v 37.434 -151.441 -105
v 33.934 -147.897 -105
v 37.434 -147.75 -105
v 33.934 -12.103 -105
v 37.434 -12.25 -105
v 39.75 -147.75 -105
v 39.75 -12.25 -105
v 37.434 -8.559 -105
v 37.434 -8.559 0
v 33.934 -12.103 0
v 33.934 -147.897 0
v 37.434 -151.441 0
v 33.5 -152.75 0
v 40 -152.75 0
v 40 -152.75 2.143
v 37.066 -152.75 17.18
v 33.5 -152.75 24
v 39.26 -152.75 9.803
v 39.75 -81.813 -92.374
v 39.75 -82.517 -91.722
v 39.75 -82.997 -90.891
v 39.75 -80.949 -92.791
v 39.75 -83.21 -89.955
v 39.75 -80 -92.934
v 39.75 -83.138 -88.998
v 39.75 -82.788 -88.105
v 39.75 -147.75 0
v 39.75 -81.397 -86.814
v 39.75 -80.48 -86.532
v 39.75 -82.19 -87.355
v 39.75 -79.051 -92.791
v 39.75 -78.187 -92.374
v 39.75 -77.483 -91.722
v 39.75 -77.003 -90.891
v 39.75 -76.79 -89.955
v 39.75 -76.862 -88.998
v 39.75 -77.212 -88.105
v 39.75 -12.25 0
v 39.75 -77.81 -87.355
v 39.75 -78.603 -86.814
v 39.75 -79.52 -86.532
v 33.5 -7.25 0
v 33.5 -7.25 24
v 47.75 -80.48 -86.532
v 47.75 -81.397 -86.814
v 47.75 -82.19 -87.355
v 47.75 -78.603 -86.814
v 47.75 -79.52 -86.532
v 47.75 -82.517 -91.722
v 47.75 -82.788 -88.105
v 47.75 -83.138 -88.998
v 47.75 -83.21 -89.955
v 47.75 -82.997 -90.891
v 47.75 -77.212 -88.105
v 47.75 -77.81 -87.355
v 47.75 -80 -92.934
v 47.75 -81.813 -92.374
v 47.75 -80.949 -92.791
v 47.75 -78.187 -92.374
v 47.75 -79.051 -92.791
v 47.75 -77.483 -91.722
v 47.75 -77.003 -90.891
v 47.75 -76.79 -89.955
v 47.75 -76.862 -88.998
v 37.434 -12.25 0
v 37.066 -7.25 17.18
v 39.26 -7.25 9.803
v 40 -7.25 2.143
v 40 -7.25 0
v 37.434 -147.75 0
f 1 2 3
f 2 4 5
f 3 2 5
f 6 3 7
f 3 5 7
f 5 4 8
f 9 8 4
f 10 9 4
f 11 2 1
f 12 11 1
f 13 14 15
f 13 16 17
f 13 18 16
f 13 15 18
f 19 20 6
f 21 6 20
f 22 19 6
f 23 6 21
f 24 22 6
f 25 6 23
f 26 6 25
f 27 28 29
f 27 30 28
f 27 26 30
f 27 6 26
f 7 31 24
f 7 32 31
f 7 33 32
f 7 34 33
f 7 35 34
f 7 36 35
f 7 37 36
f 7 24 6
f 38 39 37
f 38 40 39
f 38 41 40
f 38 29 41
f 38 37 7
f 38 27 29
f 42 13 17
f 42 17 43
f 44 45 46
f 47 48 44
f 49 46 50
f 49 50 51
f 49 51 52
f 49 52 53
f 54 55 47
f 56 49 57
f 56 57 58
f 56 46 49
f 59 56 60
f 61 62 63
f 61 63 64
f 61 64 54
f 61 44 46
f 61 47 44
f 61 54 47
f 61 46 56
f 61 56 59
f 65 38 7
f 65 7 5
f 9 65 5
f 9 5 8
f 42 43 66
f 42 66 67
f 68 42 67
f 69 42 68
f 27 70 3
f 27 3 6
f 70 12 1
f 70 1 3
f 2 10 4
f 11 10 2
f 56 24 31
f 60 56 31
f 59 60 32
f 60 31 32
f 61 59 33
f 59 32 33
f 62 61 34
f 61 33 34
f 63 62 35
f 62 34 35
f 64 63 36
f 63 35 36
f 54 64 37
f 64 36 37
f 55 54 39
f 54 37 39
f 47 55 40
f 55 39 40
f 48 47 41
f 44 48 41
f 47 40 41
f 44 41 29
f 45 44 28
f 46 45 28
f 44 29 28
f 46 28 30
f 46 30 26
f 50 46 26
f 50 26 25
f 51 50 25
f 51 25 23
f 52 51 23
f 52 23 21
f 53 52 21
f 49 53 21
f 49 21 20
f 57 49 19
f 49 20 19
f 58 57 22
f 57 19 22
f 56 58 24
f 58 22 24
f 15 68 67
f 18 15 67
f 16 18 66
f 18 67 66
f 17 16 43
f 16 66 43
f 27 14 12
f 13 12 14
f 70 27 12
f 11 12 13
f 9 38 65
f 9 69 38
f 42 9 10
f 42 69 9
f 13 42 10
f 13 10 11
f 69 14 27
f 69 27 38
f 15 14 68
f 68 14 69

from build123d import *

# Parameters (mm, degrees)
BOSS_EXTRUDE1_DEPTH = 105
BOSS_EXTRUDE2_DEPTH = 24
FILLET1_R           = 40
SKETCH5_R           = 3.219097994
BOSS_EXTRUDE3_DEPTH = 8


with BuildPart() as part:
    # Sketch1 → Boss-Extrude1 (new body)
    with BuildSketch(Plane.XY):
        Polygon((37.434072543, -12), (37.434072543, -8.558894962), (33.934072543, -12.102644962), (33.934072543, -147.897355038), (37.434072543, -151.441105038), (37.434072543, -148), (37.434072543, -147.75), (37.684072543, -147.75), (39.75, -147.75), (39.75, -12.25), (37.684072543, -12.25), (37.434072543, -12.25), align=None)
    extrude(amount=-BOSS_EXTRUDE1_DEPTH)

    # Sketch4 → Boss-Extrude2 (add)
    with BuildSketch(Plane.XY):
        Polygon((40, -152.75), (33.5, -152.75), (33.5, -7.25), (40, -7.25), (40, -80), align=None)
    extrude(amount=BOSS_EXTRUDE2_DEPTH)

    # Fillet1
    # the kernel refuses this fillet: 40 mm, written as the material it takes off along each edge
    with BuildSketch(Plane(origin=(40, 47.393732486, 24), x_dir=(0, 0, -1), z_dir=(0, -1, 0))) as fillet1_piece_1:
        with BuildLine():
            CenterArc((21.857492994, -40), FILLET1_R, 90, 33.122940208)
            Line((0, -6.5), (0, 0))
            Line((0, 0), (21.857492994, 0))
        make_face()
    extrude(amount=254.787464972, mode=Mode.SUBTRACT)

    # Sketch5 → Boss-Extrude3 (add)
    with BuildSketch(Plane(origin=(39.75, 0, 0), x_dir=(0, 0, -1), z_dir=(1, 0, 0))):
        with Locations((89.714756259, -80)):
            Circle(SKETCH5_R)
    extrude(amount=BOSS_EXTRUDE3_DEPTH)


solid = part.part
